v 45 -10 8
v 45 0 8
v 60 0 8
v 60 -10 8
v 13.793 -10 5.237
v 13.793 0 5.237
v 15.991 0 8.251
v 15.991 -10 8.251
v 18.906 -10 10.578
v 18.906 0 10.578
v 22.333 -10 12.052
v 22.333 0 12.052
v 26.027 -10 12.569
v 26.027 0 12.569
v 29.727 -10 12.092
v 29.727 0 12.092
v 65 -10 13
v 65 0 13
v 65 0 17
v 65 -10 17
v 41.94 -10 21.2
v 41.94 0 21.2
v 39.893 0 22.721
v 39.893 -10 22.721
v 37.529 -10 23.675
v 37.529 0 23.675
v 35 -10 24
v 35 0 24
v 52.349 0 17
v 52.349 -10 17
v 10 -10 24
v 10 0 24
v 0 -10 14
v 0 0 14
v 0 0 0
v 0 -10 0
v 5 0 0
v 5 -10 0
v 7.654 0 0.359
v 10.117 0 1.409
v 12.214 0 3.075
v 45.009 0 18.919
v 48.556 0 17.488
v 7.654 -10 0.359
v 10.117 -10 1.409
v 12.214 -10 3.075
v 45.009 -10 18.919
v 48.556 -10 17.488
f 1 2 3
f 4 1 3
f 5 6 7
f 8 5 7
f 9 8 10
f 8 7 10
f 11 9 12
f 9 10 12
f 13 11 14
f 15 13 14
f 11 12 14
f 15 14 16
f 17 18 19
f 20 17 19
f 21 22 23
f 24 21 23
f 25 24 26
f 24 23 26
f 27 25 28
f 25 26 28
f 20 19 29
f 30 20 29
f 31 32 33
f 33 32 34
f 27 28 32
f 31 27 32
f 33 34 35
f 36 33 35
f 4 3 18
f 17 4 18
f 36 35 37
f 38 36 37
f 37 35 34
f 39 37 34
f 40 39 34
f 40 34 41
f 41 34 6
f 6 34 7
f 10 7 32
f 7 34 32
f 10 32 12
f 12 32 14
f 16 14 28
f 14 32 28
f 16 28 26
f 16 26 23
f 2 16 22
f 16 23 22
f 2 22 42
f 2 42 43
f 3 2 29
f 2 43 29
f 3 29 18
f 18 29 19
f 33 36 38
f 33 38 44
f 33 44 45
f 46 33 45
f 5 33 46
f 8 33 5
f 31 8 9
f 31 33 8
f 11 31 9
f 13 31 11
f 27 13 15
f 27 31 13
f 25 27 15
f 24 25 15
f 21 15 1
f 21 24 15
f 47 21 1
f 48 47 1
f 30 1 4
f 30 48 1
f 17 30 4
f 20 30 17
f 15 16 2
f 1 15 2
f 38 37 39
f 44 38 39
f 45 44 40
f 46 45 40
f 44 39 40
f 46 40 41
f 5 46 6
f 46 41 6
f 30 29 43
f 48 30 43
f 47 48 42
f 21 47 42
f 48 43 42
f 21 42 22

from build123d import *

# Parameters (mm, degrees)
F1_DEPTH = 10


with BuildPart() as f1:
    # F0 (on Front) → F1 (new body)
    with BuildSketch(Plane.XZ):
        with BuildLine():
            Line((0, 14), (0, 0))
            Line((0, 0), (5, 0))
            ThreePointArc((5, 0), (10.117275, 1.408522), (13.792991, 5.237301))
            ThreePointArc((13.792991, 5.237301), (20.570263, 11.429803), (29.726646, 12.092483))
            Line((29.726646, 12.092483), (45, 8))
            Line((45, 8), (60, 8))
            Line((60, 8), (65, 13))
            Line((65, 13), (65, 17))
            Line((65, 17), (52.349352, 17))
            ThreePointArc((52.349352, 17), (46.736865, 18.089572), (41.939741, 21.2))
            ThreePointArc((41.939741, 21.2), (38.741657, 23.273618), (35, 24))
            Line((35, 24), (10, 24))
            Line((10, 24), (0, 14))
        make_face()
    extrude(amount=F1_DEPTH)


solid = f1.part
